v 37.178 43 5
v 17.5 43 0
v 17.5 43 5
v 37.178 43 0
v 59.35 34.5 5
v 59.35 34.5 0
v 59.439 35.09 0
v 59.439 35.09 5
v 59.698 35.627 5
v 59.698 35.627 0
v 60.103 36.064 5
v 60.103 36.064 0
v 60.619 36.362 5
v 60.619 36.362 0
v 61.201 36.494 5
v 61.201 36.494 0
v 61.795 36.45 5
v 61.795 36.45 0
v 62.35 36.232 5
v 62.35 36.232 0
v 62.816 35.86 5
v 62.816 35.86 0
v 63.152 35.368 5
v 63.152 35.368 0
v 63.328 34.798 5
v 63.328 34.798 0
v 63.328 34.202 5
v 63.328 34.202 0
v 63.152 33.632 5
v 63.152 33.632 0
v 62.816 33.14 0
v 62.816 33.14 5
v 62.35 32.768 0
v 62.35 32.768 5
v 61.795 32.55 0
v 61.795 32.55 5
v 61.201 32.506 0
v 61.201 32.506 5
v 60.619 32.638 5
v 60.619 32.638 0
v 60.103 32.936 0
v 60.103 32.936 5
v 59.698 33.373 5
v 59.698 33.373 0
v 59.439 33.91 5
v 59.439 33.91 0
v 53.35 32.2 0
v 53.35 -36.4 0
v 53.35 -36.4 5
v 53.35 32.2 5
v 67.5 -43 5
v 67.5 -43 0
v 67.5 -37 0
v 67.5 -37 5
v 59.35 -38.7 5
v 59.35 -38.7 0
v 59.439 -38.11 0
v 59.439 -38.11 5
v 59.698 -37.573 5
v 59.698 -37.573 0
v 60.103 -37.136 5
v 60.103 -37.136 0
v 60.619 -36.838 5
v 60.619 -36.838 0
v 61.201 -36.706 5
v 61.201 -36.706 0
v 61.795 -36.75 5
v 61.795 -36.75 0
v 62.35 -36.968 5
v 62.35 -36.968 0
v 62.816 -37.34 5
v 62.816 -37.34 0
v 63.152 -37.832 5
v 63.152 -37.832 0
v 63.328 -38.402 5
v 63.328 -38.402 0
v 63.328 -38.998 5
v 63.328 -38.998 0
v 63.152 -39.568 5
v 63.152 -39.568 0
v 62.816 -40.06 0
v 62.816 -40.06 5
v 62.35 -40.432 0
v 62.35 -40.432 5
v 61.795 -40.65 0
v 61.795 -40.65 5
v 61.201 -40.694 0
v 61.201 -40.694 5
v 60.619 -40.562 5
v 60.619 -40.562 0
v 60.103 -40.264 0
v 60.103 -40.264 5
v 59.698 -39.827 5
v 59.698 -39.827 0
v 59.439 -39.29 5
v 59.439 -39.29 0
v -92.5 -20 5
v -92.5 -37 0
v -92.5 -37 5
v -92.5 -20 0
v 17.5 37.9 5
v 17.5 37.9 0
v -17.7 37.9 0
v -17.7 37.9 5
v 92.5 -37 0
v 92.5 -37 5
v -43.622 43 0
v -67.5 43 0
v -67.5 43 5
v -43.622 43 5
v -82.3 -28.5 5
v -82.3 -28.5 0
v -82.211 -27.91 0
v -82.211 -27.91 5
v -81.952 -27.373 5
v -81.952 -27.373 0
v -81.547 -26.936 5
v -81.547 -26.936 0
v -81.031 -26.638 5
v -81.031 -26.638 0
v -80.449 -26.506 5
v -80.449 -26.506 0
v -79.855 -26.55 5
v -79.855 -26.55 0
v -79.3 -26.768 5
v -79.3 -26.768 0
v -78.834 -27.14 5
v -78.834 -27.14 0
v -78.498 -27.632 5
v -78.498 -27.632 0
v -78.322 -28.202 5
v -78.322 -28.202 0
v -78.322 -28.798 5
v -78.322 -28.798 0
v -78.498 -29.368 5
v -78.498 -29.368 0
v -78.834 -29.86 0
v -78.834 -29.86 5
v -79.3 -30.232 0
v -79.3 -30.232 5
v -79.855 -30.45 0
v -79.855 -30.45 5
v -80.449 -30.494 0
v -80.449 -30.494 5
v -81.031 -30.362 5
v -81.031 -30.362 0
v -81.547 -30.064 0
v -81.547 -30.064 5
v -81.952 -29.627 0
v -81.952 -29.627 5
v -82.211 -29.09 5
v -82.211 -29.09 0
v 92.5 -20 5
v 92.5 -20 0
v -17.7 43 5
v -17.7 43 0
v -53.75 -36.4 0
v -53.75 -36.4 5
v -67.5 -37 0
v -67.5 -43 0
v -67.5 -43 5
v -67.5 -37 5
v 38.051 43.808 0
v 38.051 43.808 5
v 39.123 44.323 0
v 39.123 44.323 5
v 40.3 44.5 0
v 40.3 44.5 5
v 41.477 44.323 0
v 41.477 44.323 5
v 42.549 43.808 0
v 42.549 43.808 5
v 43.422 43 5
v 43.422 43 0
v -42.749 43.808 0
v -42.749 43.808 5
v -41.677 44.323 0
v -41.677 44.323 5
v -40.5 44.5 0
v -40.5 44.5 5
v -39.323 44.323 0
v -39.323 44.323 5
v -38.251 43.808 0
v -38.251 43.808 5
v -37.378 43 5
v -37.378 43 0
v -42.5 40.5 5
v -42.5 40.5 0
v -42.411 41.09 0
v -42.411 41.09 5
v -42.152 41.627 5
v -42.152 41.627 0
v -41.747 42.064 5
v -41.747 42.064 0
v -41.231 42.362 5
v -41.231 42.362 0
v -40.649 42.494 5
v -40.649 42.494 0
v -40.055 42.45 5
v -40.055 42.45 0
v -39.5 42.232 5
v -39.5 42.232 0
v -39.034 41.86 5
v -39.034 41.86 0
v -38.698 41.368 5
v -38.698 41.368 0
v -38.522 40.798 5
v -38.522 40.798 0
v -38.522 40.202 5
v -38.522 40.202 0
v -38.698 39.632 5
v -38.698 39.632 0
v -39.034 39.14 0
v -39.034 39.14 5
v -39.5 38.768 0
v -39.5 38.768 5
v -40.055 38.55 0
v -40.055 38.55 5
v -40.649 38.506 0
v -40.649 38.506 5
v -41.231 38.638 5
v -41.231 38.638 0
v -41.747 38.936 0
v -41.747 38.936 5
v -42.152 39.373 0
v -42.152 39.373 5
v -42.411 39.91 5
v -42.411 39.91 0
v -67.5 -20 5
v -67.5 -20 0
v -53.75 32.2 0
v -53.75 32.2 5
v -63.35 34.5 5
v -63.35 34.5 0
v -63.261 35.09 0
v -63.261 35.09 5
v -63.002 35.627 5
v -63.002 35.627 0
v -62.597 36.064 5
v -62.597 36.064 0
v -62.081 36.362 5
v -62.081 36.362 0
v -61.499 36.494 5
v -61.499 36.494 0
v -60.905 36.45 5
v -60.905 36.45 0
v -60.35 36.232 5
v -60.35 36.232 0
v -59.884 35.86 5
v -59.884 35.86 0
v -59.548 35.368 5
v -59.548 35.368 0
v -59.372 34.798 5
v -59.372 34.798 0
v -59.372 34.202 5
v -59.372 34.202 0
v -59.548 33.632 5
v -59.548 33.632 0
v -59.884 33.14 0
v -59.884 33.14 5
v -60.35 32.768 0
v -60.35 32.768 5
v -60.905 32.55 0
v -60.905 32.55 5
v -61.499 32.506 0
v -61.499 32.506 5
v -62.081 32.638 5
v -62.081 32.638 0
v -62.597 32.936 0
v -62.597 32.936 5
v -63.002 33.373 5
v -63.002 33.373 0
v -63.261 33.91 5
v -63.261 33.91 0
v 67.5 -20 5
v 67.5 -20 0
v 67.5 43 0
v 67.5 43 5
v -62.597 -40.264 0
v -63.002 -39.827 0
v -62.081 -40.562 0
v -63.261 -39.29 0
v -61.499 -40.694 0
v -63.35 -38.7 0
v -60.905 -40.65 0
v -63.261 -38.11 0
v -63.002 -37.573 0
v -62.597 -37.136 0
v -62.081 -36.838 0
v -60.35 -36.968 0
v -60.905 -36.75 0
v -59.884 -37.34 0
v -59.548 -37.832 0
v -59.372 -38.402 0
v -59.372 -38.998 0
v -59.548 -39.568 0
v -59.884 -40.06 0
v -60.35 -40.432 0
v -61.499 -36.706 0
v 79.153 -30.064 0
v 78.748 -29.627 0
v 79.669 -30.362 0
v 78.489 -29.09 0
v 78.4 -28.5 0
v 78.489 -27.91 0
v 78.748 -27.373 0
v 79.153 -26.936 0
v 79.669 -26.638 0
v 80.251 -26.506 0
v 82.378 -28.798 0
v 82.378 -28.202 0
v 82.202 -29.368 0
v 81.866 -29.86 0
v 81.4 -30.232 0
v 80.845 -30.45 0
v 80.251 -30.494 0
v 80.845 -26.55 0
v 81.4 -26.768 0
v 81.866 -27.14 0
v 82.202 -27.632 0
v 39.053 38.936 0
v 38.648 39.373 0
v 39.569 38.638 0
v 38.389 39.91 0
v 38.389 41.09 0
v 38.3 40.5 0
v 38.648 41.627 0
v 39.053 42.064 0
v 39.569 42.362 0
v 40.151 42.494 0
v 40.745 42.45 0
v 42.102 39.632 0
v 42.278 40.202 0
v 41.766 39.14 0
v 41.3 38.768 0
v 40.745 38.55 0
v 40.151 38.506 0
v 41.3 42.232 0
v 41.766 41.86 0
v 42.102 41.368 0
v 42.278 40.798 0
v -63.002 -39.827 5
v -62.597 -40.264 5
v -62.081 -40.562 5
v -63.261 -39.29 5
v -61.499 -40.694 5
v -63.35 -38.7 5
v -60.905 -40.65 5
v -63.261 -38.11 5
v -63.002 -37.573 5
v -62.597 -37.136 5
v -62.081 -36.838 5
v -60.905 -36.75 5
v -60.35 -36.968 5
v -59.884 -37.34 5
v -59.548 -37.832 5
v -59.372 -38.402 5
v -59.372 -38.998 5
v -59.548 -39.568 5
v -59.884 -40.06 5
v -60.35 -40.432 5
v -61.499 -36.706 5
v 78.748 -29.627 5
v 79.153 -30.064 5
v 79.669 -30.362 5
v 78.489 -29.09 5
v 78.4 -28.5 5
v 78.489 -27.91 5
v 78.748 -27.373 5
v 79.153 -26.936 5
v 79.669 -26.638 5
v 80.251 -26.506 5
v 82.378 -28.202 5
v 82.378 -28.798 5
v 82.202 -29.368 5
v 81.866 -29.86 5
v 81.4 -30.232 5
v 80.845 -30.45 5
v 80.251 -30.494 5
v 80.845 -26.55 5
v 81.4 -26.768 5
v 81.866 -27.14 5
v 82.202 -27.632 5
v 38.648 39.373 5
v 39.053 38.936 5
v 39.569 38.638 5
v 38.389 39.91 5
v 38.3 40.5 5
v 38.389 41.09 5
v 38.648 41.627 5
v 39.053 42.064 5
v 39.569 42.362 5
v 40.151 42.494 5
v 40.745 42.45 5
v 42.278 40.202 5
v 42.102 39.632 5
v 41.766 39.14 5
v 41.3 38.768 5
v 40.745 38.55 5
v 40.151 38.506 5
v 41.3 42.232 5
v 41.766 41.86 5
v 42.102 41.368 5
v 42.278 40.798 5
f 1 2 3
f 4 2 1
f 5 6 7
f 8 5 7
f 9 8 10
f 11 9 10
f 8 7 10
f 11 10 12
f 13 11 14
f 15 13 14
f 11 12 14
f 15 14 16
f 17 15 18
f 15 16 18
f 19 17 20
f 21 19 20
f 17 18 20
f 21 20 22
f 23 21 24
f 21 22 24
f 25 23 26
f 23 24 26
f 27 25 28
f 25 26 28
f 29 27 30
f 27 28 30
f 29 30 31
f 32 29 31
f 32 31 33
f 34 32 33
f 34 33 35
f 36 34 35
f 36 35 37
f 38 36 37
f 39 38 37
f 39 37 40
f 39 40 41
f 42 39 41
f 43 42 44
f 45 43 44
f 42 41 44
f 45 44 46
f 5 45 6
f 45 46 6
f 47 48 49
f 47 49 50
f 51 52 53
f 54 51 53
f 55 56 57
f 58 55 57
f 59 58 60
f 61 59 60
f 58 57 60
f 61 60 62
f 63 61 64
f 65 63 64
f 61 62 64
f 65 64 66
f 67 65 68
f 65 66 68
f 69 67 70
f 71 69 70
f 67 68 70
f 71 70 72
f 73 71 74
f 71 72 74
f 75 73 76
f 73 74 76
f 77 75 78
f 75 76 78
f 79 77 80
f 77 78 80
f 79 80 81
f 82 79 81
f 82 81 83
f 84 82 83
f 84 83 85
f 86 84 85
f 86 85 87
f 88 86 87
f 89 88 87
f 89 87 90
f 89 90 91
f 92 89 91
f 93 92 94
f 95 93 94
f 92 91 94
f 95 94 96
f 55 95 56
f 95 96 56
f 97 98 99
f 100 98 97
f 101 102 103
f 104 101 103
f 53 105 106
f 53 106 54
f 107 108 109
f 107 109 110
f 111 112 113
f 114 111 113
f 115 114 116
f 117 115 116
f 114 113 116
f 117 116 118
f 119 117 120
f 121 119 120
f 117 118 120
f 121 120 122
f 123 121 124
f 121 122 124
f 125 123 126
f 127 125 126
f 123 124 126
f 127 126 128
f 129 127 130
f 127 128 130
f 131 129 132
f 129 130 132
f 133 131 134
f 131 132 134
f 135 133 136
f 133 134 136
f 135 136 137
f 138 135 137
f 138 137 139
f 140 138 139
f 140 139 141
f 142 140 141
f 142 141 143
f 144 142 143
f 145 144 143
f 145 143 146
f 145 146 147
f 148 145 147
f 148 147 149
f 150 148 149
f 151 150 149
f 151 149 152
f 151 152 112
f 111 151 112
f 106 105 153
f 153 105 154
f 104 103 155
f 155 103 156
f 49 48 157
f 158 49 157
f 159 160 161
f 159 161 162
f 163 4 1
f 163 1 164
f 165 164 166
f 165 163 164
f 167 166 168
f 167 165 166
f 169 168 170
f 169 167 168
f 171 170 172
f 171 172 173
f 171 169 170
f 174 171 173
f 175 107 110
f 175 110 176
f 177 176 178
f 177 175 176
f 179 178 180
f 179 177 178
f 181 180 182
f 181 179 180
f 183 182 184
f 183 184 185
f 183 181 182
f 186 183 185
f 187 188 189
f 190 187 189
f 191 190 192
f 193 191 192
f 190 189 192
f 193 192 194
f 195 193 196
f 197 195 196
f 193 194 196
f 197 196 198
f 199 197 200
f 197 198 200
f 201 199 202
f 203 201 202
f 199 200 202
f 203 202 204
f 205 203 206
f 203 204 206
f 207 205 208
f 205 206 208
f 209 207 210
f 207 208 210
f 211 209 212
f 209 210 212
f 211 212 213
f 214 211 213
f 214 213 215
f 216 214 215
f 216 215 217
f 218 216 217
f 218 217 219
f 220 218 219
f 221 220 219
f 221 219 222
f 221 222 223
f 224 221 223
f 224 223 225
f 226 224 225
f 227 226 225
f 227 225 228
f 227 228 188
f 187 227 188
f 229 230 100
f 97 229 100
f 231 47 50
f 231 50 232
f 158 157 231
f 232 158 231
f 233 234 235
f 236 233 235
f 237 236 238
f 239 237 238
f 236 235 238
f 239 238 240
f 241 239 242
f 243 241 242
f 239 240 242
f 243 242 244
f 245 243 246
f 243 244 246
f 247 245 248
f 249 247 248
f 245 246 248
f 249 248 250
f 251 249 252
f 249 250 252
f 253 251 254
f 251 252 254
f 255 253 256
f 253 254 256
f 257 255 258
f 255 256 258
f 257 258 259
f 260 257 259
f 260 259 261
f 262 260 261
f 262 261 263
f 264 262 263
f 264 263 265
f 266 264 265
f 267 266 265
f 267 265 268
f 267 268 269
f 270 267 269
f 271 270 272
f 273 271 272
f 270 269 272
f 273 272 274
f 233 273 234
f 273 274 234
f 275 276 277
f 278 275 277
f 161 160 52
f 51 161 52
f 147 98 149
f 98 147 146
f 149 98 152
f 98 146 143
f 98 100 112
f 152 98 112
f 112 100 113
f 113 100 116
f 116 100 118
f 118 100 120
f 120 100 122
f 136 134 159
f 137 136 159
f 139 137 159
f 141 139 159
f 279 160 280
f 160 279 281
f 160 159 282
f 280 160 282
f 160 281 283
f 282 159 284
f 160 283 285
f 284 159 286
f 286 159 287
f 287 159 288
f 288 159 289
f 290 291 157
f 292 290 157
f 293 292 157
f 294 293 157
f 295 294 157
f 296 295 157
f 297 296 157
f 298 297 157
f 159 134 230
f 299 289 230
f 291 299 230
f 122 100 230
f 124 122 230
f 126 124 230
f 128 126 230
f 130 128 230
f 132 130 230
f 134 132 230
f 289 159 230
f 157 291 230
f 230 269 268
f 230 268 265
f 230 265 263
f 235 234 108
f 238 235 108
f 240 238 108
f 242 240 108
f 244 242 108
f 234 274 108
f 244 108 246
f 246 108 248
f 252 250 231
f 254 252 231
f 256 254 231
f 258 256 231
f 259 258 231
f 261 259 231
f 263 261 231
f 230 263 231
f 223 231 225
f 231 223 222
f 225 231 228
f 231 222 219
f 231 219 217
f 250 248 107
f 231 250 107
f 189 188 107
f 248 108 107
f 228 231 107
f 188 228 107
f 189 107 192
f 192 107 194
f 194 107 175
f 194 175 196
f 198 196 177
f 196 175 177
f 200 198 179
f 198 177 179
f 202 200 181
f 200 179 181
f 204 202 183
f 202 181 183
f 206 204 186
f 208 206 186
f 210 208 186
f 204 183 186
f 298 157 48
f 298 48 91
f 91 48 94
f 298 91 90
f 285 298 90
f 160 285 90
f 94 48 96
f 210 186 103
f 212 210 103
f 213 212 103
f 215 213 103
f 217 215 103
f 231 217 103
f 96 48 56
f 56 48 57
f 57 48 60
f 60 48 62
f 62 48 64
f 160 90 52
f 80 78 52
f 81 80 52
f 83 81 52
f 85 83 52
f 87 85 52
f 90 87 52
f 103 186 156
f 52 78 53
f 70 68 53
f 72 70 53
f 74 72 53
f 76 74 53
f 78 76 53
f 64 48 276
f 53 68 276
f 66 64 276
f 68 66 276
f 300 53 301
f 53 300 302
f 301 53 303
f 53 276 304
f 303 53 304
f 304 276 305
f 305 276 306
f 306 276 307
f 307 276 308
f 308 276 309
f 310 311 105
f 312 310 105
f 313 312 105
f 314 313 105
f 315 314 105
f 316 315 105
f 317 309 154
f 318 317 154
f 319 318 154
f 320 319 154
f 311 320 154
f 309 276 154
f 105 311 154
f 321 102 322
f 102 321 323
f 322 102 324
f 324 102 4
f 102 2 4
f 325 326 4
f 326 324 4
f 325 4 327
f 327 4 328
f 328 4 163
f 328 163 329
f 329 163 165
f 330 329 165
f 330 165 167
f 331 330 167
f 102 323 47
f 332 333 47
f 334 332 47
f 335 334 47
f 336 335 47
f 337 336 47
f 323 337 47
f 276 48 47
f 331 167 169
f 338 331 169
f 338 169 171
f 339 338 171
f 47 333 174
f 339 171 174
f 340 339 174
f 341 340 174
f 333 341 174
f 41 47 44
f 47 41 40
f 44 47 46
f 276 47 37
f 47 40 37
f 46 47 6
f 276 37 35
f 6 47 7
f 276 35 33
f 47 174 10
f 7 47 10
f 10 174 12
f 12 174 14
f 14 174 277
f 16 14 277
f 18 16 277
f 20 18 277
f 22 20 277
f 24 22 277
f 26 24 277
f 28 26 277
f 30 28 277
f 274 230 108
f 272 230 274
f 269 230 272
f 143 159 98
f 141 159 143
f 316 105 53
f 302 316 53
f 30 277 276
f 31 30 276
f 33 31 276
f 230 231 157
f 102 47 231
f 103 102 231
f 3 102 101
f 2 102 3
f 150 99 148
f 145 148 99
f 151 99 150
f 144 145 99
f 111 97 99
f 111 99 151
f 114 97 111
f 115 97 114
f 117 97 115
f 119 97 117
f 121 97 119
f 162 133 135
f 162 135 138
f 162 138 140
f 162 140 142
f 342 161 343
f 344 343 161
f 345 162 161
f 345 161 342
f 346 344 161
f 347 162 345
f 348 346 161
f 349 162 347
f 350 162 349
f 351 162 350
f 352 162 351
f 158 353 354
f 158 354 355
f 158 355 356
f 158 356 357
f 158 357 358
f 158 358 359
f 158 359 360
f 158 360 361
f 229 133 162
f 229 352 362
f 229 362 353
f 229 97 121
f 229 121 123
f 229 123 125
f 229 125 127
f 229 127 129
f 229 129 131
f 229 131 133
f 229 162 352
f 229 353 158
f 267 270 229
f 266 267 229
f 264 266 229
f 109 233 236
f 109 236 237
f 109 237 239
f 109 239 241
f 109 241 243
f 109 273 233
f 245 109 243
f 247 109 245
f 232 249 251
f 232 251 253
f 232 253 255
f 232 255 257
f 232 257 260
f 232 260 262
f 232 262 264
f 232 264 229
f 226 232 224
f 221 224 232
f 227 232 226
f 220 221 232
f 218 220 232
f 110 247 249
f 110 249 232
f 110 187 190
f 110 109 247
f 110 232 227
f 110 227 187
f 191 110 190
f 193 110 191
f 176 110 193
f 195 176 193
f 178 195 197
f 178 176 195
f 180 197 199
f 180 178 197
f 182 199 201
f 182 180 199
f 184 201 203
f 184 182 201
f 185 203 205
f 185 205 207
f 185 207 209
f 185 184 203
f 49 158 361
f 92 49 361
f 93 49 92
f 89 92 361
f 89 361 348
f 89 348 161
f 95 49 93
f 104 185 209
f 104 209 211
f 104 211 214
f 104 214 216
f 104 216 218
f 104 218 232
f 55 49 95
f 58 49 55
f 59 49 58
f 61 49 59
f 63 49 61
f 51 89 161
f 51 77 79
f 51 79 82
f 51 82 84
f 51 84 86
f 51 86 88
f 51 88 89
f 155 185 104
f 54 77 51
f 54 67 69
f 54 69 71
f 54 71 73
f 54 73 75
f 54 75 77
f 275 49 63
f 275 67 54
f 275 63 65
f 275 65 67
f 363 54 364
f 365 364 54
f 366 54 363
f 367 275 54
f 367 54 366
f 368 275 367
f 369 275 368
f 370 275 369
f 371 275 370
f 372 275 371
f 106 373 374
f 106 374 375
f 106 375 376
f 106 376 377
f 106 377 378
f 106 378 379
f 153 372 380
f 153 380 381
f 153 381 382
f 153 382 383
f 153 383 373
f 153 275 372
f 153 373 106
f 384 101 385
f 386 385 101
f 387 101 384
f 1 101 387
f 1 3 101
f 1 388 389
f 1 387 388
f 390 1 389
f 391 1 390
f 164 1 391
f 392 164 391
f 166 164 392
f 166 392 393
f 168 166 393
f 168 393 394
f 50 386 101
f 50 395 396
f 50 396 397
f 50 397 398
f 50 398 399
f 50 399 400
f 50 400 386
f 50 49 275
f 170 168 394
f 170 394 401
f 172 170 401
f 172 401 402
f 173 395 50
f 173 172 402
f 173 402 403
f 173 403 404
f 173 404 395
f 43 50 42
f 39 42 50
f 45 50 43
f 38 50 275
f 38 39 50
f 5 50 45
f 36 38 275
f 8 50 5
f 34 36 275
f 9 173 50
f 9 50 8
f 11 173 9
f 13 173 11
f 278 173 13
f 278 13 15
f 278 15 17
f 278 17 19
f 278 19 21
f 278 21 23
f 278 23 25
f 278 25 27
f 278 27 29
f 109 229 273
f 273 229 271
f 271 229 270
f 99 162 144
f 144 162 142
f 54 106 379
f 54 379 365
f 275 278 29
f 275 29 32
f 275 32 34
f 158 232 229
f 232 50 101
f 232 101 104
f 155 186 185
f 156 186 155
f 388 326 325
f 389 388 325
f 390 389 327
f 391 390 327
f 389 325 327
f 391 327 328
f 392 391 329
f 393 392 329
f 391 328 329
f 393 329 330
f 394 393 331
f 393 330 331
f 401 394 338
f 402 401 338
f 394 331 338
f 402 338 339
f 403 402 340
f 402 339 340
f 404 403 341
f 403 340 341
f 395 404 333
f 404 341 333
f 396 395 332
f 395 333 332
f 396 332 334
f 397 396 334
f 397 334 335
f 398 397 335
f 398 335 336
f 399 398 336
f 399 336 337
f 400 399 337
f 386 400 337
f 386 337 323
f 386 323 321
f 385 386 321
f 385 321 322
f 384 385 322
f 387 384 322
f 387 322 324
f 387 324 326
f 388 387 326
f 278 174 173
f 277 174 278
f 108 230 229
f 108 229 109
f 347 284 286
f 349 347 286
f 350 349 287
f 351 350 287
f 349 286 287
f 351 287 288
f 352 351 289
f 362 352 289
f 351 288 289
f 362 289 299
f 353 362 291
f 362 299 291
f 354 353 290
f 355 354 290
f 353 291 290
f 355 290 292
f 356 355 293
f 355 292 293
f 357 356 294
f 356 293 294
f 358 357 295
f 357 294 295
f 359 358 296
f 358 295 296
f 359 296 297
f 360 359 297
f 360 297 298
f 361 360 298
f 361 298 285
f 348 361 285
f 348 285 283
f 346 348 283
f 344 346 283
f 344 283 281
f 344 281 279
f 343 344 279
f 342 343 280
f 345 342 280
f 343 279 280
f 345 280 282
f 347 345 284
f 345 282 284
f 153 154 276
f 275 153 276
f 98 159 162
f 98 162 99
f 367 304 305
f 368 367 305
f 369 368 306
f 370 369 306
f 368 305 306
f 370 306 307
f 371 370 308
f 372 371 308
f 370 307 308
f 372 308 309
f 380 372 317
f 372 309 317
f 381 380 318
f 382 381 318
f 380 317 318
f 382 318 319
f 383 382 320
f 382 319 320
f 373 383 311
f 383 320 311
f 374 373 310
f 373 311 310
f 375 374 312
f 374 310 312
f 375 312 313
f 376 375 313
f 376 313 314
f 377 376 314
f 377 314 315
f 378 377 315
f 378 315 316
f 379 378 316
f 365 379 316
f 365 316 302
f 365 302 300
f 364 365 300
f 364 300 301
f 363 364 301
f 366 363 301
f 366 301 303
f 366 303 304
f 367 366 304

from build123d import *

# Parameters (mm, degrees)
SKETCH1_W           = 135
SKETCH1_H           = 86
BOSS_EXTRUDE1_DEPTH = 5
SKETCH2_W           = 35.2
SKETCH2_H           = 5.1
CUT_EXTRUDE1_DEPTH  = 5
SKETCH3_W           = 25
SKETCH3_H           = 17
BOSS_EXTRUDE2_DEPTH = 5
SKETCH4_W           = 107.1
SKETCH4_H           = 68.6
CUT_EXTRUDE2_DEPTH  = 5
SKETCH5_R           = 2
CUT_EXTRUDE3_DEPTH  = 10
SKETCH6_R           = 4
SKETCH6_R_2         = 2
BOSS_EXTRUDE3_DEPTH = 5
SKETCH7_R           = 2
CUT_EXTRUDE4_DEPTH  = 5


with BuildPart() as part:
    # Sketch1 → Boss-Extrude1 (new body)
    with BuildSketch(Plane.XY):
        Rectangle(SKETCH1_W, SKETCH1_H)
    extrude(amount=BOSS_EXTRUDE1_DEPTH)

    # Sketch2 → Cut-Extrude1 (cut)
    with BuildSketch(Plane(origin=(0, 0, 0), x_dir=(-1, 0, 0), z_dir=(0, 0, -1))):
        with Locations((0.1, 40.45)):
            Rectangle(SKETCH2_W, SKETCH2_H)
    extrude(amount=-CUT_EXTRUDE1_DEPTH, mode=Mode.SUBTRACT)

    # Sketch3 → Boss-Extrude2 (add)
    with BuildSketch(Plane(origin=(0, 0, 0), x_dir=(-1, 0, 0), z_dir=(0, 0, -1))):
        with Locations((80, -28.5)):
            Rectangle(SKETCH3_W, SKETCH3_H)
        with Locations((-80, -28.5)):
            Rectangle(SKETCH3_W, SKETCH3_H)
    extrude(amount=-BOSS_EXTRUDE2_DEPTH)

    # Sketch4 → Cut-Extrude2 (cut)
    with BuildSketch(Plane(origin=(0, 0, 0), x_dir=(-1, 0, 0), z_dir=(0, 0, -1))):
        with Locations((0.2, -2.1)):
            Rectangle(SKETCH4_W, SKETCH4_H)
    extrude(amount=-CUT_EXTRUDE2_DEPTH, mode=Mode.SUBTRACT)

    # Sketch5 → Cut-Extrude3 (cut)
    with BuildSketch(Plane(origin=(0, 0, 0), x_dir=(-1, 0, 0), z_dir=(0, 0, -1))):
        with Locations((-40.3, 40.5)):
            Circle(SKETCH5_R)
        with Locations((-80.4, -28.5)):
            Circle(SKETCH5_R)
        with Locations((80.3, -28.5)):
            Circle(SKETCH5_R)
        with Locations((40.5, 40.5)):
            Circle(SKETCH5_R)
    extrude(amount=-CUT_EXTRUDE3_DEPTH, mode=Mode.SUBTRACT)

    # Sketch6 → Boss-Extrude3 (add)
    with BuildSketch(Plane(origin=(0, 0, 0), x_dir=(-1, 0, 0), z_dir=(0, 0, -1))):
        with Locations((40.5, 40.5)):
            Circle(SKETCH6_R)
        with Locations((40.5, 40.5)):
            Circle(SKETCH6_R_2, mode=Mode.SUBTRACT)
        with Locations((-40.3, 40.5)):
            Circle(SKETCH6_R)
        with Locations((-40.3, 40.5)):
            Circle(SKETCH6_R_2, mode=Mode.SUBTRACT)
    extrude(amount=-BOSS_EXTRUDE3_DEPTH)

    # Sketch7 → Cut-Extrude4 (cut)
    with BuildSketch(Plane(origin=(0, 0, 0), x_dir=(-1, 0, 0), z_dir=(0, 0, -1))):
        with Locations((61.35, -38.7)):
            Circle(SKETCH7_R)
        with Locations((-61.35, -38.7)):
            Circle(SKETCH7_R)
        with Locations((-61.35, 34.5)):
            Circle(SKETCH7_R)
        with Locations((61.35, 34.5)):
            Circle(SKETCH7_R)
    extrude(amount=-CUT_EXTRUDE4_DEPTH, mode=Mode.SUBTRACT)


solid = part.part
